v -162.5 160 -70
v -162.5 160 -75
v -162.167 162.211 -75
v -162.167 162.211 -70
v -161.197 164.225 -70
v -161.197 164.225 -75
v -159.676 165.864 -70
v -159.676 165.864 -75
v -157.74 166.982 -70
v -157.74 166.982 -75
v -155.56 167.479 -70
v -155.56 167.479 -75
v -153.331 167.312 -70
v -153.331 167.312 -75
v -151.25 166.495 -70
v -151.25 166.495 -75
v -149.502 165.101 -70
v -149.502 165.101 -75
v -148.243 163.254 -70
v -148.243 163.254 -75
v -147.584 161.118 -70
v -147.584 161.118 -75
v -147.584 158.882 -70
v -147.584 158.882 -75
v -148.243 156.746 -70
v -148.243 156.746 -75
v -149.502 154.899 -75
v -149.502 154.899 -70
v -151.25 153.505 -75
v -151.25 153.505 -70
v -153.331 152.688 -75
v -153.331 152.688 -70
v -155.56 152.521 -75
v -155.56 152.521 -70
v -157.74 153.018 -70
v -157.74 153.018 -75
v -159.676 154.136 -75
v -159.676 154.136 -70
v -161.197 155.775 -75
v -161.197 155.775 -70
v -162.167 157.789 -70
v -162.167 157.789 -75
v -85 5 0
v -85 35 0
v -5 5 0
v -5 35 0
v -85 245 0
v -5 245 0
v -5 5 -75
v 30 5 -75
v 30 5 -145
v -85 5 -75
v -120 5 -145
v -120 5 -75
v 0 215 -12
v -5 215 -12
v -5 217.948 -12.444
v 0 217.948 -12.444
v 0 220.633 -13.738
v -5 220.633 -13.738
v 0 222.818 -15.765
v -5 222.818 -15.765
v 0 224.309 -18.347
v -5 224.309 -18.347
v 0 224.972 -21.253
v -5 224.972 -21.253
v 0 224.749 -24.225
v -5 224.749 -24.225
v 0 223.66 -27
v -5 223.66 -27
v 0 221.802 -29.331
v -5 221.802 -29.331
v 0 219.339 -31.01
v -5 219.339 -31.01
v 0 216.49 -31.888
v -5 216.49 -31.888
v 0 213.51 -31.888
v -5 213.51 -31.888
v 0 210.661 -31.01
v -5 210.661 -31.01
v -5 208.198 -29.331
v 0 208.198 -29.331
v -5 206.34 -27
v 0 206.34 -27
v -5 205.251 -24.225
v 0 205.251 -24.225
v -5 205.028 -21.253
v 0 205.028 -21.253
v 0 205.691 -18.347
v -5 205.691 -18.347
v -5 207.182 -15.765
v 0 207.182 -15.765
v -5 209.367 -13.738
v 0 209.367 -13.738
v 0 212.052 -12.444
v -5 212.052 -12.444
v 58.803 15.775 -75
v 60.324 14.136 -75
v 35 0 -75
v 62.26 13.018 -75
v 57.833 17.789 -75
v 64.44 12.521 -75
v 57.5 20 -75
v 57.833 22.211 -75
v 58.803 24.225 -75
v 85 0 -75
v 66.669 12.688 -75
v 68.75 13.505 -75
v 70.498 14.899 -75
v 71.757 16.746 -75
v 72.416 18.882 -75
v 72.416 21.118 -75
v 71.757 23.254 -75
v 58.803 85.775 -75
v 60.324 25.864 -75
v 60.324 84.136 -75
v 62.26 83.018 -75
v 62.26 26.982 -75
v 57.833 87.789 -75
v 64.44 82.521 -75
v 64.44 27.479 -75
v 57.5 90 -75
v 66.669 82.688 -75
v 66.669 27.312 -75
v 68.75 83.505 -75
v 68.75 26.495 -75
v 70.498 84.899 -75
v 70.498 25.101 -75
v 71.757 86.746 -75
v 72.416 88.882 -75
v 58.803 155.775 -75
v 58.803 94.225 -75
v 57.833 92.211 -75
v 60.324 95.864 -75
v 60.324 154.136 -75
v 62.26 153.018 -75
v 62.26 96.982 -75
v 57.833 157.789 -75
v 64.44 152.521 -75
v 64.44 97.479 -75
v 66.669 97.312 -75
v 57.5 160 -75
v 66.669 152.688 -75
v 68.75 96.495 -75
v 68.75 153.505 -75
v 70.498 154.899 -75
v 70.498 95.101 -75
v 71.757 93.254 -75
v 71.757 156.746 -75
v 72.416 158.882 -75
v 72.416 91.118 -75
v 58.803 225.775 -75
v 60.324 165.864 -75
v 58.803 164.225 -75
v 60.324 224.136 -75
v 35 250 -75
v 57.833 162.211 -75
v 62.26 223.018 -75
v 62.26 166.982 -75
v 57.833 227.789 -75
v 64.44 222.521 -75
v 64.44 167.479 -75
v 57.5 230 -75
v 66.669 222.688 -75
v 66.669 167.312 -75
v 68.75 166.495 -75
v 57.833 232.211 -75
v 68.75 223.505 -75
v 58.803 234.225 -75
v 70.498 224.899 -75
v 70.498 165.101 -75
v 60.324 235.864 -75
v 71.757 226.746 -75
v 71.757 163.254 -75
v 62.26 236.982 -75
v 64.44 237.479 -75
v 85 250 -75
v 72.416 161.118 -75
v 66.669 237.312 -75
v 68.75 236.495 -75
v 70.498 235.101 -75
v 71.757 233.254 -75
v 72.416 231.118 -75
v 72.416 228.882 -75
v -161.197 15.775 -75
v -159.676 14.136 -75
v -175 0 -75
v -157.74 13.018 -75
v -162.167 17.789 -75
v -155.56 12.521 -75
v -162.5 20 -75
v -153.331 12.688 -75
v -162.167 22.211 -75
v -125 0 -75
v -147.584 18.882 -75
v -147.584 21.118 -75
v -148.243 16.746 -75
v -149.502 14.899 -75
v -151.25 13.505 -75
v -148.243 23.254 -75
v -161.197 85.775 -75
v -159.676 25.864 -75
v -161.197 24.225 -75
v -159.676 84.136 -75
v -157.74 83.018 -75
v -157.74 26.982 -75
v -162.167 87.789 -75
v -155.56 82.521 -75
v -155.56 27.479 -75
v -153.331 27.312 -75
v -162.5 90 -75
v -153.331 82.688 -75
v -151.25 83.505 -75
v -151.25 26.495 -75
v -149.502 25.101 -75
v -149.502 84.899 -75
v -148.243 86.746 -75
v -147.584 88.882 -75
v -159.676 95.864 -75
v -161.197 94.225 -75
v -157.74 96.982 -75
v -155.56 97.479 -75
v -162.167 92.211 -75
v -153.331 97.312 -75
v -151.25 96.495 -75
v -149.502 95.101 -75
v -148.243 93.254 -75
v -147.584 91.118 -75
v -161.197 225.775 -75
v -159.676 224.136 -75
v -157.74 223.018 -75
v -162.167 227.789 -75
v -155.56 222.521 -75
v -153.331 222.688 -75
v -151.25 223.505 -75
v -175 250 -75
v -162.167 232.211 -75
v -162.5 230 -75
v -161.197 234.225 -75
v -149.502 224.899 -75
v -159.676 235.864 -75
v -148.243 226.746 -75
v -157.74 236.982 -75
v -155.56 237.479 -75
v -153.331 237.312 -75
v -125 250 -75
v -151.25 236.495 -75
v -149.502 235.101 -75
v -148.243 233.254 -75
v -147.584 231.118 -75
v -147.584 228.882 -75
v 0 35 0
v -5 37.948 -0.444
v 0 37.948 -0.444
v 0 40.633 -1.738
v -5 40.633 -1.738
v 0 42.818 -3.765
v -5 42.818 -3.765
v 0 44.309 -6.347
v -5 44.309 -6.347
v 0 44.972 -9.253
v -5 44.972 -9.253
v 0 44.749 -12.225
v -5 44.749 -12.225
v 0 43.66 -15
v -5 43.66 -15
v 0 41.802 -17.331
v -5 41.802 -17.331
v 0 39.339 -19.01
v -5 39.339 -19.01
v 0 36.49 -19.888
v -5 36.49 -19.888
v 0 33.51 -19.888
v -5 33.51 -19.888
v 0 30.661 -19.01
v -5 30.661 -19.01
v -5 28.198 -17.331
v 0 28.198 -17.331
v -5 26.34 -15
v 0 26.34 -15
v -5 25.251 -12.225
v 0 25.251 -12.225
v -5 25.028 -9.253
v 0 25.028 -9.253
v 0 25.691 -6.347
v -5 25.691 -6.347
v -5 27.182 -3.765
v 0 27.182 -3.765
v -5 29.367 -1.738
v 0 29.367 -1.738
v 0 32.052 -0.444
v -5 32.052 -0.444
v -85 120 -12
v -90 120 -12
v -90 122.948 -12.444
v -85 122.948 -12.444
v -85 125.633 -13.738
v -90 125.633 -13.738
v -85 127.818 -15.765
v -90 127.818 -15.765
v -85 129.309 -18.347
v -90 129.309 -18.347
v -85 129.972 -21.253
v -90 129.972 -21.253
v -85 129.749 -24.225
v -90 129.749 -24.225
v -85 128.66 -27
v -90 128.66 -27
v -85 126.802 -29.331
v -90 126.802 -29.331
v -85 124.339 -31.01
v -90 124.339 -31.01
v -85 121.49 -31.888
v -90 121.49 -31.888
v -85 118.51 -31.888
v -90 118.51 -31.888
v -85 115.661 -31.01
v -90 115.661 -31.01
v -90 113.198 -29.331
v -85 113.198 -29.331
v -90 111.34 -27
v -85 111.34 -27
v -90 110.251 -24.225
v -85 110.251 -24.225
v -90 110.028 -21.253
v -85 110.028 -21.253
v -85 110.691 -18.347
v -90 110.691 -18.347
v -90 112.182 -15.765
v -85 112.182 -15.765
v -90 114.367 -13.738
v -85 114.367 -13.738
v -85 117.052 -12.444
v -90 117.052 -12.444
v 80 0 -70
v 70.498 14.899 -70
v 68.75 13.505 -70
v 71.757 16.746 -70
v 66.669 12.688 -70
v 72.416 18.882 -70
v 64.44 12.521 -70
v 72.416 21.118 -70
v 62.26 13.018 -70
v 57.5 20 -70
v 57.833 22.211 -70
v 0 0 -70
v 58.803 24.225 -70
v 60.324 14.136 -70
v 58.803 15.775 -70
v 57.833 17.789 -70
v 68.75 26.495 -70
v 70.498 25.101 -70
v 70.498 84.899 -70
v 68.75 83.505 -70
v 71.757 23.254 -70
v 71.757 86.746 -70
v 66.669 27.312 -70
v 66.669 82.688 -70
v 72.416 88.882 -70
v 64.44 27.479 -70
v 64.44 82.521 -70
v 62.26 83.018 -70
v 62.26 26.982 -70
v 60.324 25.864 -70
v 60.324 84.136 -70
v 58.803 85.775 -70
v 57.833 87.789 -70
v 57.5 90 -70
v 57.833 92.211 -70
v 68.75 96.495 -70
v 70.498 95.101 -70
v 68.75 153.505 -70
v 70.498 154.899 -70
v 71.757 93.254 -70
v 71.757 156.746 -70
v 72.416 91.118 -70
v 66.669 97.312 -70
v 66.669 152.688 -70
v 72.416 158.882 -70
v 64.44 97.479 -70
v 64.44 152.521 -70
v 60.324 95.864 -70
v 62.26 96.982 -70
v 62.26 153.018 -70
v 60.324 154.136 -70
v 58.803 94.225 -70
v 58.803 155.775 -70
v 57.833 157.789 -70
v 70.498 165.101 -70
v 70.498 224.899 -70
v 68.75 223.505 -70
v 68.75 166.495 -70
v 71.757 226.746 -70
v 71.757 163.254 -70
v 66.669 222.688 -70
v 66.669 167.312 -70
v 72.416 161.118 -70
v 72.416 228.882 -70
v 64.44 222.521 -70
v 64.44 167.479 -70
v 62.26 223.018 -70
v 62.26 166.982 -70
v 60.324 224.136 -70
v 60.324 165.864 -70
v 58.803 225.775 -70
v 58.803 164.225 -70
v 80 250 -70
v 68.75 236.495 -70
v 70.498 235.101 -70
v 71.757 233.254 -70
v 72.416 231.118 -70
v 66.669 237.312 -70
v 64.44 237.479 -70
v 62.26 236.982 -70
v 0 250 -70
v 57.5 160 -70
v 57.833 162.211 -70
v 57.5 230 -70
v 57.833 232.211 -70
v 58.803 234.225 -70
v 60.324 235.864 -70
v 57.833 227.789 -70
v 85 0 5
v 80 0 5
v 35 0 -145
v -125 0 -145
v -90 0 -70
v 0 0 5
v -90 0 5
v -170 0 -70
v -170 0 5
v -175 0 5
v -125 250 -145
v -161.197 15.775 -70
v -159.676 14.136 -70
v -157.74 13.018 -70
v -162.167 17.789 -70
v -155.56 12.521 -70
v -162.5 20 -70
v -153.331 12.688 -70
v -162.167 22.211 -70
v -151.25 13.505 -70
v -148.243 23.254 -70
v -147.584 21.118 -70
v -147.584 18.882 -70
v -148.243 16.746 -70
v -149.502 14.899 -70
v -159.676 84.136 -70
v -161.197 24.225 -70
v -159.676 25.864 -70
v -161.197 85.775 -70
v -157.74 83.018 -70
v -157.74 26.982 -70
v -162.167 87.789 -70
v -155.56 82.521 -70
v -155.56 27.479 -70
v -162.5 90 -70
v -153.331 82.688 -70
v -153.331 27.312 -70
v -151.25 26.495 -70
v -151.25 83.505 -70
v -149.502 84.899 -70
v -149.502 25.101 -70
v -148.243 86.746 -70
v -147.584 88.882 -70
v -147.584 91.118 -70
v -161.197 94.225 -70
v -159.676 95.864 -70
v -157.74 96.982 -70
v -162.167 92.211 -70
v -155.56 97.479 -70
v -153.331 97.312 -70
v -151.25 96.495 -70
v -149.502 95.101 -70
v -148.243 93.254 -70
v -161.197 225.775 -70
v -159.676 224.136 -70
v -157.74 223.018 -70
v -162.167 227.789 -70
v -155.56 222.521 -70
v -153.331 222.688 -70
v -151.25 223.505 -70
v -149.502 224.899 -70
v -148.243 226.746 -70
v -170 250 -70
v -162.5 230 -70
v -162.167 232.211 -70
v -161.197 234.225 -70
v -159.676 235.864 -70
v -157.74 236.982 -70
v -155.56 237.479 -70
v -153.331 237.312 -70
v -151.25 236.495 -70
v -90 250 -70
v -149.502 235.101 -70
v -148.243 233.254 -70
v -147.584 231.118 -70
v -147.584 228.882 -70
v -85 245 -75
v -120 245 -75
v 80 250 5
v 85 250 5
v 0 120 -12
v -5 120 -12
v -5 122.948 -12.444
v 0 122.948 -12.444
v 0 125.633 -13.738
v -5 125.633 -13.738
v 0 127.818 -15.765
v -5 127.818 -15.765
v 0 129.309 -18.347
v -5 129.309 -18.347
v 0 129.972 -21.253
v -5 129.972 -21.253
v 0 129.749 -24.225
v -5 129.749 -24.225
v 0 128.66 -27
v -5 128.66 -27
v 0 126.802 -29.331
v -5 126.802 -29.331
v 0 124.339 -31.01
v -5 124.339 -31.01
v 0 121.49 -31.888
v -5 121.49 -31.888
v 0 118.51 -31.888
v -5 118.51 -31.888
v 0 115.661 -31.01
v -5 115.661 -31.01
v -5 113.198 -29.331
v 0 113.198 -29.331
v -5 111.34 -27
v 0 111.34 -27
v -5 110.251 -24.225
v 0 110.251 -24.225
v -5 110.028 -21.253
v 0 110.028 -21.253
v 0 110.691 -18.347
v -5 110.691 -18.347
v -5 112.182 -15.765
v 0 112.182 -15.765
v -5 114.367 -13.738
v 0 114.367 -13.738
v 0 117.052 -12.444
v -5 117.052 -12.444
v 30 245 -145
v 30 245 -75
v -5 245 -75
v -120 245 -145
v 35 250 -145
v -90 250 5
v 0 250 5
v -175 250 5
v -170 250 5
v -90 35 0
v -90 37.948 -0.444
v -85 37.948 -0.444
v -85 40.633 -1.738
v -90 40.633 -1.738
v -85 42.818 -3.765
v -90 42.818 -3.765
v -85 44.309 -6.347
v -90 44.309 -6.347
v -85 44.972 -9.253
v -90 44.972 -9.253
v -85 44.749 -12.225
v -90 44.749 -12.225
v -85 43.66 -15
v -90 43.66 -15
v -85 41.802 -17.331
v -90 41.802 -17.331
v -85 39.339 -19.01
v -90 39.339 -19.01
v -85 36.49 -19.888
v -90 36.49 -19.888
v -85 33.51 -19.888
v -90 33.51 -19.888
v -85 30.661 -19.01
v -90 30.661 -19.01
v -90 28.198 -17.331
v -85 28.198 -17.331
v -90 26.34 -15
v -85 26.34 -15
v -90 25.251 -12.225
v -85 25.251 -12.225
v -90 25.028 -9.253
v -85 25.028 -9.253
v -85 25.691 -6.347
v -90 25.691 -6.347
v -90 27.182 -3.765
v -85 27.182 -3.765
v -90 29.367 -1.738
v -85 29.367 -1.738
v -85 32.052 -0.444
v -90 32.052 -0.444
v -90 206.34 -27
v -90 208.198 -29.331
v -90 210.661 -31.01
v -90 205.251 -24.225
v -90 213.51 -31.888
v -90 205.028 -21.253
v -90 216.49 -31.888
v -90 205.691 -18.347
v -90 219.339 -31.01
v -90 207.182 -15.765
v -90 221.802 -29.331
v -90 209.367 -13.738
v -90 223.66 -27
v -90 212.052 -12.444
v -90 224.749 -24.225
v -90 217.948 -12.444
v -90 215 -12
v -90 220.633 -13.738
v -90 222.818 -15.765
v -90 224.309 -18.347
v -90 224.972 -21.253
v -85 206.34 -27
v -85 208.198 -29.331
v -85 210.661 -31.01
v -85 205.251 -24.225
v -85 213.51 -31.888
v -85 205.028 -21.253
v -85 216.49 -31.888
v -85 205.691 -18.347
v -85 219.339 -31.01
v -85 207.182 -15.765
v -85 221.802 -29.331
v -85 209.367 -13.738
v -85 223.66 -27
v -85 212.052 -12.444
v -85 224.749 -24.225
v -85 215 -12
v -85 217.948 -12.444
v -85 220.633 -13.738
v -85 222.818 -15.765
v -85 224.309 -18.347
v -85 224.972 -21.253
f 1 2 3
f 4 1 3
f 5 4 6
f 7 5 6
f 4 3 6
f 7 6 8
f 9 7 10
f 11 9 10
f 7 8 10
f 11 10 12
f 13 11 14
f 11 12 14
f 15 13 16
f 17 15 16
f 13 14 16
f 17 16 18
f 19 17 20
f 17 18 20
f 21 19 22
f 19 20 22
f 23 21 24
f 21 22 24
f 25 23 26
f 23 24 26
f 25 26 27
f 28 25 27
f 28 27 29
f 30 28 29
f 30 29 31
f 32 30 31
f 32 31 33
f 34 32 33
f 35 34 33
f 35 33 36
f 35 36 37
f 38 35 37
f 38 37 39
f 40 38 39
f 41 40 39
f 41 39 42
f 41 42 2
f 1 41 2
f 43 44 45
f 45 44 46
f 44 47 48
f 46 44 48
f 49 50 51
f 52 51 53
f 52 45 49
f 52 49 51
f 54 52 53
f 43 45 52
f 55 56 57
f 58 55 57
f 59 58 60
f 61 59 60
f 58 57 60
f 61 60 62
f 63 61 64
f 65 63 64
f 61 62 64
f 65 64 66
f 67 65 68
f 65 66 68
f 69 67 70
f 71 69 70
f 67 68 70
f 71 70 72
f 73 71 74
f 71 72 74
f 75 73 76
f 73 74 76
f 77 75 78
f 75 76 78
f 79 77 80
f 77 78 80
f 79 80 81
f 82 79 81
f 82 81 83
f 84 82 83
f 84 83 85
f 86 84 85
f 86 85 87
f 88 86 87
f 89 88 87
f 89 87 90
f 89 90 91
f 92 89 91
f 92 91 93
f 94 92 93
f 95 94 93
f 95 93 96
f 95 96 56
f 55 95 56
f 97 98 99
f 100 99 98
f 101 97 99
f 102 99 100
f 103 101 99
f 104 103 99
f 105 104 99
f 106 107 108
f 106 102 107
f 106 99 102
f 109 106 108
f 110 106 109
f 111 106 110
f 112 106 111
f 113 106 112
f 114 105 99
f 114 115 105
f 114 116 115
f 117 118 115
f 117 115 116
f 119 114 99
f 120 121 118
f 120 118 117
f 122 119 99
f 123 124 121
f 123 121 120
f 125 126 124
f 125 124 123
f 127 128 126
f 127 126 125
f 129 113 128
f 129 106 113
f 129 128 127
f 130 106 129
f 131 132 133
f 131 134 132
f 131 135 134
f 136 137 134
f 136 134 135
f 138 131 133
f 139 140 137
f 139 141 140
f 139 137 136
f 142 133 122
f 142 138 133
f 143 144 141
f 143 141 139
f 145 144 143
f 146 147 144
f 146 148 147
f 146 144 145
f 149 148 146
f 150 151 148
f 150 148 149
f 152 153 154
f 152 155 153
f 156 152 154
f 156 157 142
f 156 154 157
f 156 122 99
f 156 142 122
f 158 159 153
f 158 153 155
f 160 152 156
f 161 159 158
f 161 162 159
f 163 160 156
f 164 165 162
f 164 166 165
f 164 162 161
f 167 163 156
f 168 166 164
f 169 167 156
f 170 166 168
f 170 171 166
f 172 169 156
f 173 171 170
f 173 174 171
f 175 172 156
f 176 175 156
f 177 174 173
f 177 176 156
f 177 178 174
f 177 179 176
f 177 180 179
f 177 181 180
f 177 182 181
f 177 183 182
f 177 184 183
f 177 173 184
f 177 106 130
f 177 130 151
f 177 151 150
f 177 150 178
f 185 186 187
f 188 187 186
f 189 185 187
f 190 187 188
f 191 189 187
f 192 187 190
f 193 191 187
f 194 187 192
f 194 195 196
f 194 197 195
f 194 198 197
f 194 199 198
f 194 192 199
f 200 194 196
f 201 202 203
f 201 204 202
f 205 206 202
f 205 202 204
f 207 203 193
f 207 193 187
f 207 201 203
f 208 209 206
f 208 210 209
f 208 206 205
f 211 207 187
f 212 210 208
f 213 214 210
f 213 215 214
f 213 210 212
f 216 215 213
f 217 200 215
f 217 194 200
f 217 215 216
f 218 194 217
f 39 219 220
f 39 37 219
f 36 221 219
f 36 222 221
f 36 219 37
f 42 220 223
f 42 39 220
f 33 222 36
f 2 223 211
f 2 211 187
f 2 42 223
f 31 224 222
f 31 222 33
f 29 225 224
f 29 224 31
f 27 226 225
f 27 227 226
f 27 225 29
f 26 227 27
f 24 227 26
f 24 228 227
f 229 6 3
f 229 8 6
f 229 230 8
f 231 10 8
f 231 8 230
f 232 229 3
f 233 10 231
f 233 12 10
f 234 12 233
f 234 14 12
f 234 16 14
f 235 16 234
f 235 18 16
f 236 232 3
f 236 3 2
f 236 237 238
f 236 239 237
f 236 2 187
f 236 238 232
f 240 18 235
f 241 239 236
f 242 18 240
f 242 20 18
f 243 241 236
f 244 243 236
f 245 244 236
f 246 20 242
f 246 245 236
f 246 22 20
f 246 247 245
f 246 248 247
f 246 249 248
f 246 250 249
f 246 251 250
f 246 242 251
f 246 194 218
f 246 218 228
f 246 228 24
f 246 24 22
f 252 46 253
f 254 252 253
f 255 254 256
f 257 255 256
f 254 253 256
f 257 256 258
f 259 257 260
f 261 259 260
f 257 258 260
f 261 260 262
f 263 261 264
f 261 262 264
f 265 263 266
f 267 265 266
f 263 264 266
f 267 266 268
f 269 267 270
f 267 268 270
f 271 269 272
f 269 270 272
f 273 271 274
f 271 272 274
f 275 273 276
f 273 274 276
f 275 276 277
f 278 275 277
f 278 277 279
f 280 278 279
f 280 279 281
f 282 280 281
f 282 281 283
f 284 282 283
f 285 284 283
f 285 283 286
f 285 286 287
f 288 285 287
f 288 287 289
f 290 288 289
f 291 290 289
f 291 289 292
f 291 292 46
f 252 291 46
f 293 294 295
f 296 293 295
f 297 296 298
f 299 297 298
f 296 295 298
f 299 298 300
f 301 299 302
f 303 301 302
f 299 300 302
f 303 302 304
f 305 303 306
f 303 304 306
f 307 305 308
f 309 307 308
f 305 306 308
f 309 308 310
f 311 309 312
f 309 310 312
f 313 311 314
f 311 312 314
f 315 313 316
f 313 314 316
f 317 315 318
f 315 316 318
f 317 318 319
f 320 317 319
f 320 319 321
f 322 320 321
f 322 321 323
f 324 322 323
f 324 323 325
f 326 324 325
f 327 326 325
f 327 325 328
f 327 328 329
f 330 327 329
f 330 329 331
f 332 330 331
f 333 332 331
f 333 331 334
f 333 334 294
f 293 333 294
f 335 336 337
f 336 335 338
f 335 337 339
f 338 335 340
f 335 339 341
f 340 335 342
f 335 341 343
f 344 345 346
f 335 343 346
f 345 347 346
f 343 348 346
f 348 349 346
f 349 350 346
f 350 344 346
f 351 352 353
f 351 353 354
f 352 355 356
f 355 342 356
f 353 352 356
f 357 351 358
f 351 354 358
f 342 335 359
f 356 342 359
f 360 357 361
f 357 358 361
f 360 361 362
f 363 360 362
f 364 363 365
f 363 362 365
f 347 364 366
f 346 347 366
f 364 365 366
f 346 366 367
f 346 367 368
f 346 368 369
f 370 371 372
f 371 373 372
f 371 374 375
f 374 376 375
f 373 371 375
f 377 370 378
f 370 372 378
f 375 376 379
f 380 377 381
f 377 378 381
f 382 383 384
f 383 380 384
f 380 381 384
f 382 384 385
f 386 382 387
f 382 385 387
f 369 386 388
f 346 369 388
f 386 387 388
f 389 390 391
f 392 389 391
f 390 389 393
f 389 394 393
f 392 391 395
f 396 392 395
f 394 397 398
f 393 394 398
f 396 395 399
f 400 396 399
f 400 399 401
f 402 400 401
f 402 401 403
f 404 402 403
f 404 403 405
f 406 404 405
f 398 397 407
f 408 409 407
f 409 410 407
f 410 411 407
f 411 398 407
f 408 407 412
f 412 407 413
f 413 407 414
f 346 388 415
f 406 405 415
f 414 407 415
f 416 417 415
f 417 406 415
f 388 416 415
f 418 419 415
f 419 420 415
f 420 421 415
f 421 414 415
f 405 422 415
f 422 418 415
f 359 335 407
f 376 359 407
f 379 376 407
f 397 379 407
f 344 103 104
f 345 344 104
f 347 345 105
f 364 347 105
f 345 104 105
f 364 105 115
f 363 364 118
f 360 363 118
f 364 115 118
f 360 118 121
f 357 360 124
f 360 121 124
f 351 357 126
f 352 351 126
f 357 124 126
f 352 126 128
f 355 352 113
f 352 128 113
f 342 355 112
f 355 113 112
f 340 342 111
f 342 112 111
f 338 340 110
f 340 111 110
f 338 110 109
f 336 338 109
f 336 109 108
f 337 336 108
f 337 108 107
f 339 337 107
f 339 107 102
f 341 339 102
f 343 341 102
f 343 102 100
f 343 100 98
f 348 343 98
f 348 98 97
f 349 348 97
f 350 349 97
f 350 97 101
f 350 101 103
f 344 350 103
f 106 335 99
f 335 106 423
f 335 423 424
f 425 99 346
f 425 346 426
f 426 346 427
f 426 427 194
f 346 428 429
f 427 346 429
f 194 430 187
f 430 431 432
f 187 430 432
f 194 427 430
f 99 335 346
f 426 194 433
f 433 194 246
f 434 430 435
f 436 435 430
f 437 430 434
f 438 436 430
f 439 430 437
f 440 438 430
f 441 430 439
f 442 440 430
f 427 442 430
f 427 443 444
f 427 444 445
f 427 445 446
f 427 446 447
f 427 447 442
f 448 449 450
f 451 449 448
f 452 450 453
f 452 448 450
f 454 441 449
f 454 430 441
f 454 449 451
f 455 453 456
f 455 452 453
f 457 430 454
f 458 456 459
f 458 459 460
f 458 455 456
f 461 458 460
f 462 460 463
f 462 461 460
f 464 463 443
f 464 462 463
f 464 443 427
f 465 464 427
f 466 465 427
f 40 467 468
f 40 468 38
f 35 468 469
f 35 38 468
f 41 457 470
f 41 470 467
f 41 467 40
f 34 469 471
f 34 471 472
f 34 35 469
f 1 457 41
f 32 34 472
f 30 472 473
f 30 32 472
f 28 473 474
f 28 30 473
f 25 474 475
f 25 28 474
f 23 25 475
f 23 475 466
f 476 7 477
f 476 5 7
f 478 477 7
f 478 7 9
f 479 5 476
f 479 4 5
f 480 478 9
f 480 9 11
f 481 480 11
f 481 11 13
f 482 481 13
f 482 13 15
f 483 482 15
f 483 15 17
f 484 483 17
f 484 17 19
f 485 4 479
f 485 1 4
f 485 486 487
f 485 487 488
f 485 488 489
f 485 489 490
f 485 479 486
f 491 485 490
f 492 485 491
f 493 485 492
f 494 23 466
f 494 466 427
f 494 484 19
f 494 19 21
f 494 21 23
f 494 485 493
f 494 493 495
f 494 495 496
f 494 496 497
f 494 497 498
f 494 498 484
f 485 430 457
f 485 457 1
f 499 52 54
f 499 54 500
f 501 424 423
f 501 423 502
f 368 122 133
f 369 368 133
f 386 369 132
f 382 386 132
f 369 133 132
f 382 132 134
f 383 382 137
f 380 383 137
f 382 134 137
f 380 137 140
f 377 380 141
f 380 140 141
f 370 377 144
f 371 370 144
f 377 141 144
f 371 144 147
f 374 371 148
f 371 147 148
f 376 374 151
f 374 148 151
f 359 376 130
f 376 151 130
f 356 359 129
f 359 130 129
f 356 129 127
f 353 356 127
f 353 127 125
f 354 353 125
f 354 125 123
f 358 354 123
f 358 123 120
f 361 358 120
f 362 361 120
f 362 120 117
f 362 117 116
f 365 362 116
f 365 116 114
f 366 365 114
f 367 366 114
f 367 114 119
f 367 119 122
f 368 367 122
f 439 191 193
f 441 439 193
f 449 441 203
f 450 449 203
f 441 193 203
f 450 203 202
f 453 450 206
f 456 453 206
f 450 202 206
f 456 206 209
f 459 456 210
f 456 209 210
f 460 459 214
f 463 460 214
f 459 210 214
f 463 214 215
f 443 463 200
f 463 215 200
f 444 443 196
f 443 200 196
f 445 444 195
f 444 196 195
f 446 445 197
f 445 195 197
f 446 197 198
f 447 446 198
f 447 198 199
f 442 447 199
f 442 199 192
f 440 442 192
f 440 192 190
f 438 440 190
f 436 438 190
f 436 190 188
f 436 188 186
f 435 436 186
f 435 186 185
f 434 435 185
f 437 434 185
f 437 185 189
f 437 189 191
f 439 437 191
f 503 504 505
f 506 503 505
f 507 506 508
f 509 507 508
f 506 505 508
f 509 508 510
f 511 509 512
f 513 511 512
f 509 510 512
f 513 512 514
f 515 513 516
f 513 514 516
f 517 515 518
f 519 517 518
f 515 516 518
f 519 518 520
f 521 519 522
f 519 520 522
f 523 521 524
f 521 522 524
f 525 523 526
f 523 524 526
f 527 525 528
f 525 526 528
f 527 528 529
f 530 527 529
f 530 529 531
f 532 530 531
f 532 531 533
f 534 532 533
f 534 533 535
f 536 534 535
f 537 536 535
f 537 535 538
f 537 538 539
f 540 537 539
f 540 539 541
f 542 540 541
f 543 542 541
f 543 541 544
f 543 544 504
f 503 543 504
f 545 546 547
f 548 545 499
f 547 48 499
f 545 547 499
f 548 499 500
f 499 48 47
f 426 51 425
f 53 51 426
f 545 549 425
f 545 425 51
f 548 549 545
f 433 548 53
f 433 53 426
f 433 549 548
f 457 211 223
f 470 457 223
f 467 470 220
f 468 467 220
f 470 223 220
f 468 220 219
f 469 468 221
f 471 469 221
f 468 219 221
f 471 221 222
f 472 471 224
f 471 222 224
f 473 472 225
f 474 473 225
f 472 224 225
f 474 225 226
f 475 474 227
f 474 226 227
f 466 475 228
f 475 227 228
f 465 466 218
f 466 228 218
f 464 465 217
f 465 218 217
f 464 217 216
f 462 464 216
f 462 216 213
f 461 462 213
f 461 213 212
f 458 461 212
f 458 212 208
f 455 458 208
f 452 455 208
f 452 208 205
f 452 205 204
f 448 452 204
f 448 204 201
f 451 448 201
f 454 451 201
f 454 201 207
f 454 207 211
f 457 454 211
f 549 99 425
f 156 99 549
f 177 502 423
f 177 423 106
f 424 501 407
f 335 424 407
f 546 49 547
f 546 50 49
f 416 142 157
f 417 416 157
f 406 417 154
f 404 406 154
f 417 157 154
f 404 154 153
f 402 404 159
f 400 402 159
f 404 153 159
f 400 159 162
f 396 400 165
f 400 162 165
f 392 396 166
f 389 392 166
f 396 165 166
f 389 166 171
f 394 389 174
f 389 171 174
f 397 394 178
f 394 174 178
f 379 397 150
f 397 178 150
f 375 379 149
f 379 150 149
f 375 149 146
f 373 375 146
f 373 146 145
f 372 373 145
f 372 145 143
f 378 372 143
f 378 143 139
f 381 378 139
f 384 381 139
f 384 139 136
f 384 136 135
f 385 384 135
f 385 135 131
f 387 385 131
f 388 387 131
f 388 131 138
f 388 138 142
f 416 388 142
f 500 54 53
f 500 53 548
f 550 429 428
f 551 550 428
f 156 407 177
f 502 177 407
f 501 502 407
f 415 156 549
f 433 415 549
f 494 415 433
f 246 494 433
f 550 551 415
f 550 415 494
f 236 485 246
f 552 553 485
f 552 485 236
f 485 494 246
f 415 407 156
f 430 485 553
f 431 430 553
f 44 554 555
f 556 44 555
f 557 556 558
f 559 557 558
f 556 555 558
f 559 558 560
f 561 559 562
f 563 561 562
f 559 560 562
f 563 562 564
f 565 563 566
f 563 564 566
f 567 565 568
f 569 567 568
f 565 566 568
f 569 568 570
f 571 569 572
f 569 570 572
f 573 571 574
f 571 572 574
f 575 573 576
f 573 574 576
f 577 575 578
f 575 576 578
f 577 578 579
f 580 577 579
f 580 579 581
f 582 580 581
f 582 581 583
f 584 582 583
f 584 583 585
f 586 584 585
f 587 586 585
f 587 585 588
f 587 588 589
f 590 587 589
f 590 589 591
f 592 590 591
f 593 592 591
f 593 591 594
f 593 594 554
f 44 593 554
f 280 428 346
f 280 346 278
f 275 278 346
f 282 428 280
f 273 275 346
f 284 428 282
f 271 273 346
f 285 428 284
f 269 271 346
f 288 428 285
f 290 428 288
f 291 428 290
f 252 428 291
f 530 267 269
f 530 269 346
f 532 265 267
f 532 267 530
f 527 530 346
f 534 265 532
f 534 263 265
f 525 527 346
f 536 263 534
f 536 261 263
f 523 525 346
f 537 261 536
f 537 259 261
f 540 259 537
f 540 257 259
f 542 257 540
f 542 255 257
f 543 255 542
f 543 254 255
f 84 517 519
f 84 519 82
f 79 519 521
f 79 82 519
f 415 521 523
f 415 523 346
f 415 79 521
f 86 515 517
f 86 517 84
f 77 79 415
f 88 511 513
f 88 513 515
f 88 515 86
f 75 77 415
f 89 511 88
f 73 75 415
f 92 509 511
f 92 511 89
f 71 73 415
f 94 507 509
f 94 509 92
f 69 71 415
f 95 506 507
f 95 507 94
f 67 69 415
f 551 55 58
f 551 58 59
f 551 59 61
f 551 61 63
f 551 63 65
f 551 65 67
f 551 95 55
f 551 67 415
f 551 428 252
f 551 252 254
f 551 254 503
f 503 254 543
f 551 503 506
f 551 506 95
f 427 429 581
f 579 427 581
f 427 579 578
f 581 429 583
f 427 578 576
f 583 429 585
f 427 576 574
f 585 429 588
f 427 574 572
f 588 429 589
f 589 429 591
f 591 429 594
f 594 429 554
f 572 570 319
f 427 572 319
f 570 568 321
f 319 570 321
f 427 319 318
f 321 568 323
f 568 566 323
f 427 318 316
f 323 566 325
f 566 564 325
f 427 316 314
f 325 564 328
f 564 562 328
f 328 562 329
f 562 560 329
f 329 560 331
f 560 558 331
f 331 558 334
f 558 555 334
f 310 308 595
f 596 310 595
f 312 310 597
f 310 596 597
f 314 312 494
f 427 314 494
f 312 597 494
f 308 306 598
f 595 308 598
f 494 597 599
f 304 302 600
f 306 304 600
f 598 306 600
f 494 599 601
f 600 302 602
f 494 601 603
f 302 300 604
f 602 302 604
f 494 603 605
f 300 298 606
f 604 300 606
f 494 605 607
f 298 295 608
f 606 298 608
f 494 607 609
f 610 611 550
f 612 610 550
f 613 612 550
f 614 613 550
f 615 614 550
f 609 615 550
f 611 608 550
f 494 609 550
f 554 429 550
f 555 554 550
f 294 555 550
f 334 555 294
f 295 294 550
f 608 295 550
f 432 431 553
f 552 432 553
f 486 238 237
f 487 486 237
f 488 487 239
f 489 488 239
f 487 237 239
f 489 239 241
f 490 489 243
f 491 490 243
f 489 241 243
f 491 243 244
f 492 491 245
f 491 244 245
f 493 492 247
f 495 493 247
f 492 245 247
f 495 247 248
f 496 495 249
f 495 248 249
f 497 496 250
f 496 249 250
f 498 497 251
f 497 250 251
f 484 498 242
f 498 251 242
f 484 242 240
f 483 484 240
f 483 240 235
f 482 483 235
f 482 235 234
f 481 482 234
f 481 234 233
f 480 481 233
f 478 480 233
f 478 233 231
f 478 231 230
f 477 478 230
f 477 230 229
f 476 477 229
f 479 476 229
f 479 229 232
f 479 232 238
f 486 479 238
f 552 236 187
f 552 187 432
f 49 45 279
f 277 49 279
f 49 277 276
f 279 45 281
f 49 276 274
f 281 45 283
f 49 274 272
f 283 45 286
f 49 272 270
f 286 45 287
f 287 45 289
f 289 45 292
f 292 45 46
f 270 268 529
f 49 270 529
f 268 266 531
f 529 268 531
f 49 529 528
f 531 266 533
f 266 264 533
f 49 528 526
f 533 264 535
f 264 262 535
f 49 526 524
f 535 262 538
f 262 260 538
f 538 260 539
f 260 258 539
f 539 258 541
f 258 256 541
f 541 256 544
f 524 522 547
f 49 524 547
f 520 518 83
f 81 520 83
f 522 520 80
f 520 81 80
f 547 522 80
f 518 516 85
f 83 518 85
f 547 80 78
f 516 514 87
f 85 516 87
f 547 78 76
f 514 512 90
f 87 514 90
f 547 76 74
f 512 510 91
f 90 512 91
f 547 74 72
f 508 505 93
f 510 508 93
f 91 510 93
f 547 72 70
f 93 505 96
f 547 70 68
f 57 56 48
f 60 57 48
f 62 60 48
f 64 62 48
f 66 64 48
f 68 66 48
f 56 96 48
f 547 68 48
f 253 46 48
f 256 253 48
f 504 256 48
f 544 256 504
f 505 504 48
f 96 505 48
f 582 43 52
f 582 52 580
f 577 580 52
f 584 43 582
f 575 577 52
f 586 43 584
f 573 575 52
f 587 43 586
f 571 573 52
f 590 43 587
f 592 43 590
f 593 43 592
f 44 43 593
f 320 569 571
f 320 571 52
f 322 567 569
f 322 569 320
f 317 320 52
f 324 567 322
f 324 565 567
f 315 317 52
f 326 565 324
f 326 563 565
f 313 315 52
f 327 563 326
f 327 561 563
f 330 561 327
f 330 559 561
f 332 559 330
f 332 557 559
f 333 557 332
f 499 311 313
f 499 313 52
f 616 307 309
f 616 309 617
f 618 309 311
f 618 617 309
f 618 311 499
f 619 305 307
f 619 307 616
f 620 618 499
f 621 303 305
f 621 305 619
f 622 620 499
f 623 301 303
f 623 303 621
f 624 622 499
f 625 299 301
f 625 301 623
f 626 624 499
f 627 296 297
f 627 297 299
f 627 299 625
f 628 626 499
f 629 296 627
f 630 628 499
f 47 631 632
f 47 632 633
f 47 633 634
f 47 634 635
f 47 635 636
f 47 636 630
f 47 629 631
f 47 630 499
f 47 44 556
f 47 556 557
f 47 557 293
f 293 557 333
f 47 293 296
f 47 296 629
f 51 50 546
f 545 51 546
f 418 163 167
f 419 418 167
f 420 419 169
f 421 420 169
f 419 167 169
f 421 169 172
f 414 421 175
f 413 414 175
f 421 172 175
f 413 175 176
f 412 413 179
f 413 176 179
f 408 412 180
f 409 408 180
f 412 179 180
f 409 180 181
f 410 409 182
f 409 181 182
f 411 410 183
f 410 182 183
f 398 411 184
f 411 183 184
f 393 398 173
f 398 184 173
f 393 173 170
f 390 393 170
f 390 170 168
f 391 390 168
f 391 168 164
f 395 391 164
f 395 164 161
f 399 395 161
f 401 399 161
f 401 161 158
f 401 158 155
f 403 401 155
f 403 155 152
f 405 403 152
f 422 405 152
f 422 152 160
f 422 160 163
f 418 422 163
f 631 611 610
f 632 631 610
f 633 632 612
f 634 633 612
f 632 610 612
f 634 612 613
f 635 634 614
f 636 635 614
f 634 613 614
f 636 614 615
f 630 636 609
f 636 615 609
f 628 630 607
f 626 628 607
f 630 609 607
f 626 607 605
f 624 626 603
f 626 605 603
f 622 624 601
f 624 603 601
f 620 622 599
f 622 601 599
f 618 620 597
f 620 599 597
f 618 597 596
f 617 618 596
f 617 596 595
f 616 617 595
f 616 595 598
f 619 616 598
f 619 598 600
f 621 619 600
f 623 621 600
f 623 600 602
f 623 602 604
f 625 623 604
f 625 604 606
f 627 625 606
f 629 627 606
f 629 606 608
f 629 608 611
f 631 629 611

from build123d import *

# Parameters (mm, degrees)
ESQUISSE1_W             = 90
ESQUISSE1_H             = 250
BOSS_EXTRU_1_DEPTH      = 5
ESQUISSE2_W             = 90
ESQUISSE2_H             = 250
ESQUISSE2_W_2           = 80
ESQUISSE2_H_2           = 240
BOSS_EXTRU_2_DEPTH      = 70
BOSS_EXTRU_3_DEPTH      = 5
ESQUISSE4_R             = 10
ENL_V_MAT_EXTRU_2_DEPTH = 171
ESQUISSE5_W             = 80
ESQUISSE5_H             = 250
BOSS_EXTRU_4_DEPTH      = 5
ESQUISSE6_W             = 80
ESQUISSE6_H             = 250
BOSS_EXTRU_5_DEPTH      = 5
ESQUISSE7_W             = 160
ESQUISSE7_H             = 250
ESQUISSE7_W_2           = 150
ESQUISSE7_H_2           = 240
BOSS_EXTRU_6_DEPTH      = 70
ESQUISSE10_R            = 7.5
ENL_V_MAT_EXTRU_3_DEPTH = 50


with BuildPart() as part:
    # Esquisse1 → Boss.-Extru.1 (new body)
    with BuildSketch(Plane.XY):
        with Locations((-45, 125)):
            Rectangle(ESQUISSE1_W, ESQUISSE1_H)
    extrude(amount=BOSS_EXTRU_1_DEPTH)

    # Esquisse2 → Boss.-Extru.2 (add)
    with BuildSketch(Plane(origin=(0, 0, 0), x_dir=(-1, 0, 0), z_dir=(0, 0, -1))):
        with Locations((45, 125)):
            Rectangle(ESQUISSE2_W, ESQUISSE2_H)
        with Locations((45, 125)):
            Rectangle(ESQUISSE2_W_2, ESQUISSE2_H_2, mode=Mode.SUBTRACT)
    extrude(amount=BOSS_EXTRU_2_DEPTH)

    # Esquisse3 → Boss.-Extru.3 (add)
    with BuildSketch(Plane(origin=(0, 0, -70), x_dir=(-1, 0, 0), z_dir=(0, 0, -1))):
        Polygon((6.025463364, 250), (-80, 250), (-80, 0), (-15, 0), (45, 0), (45, 5), (5, 5), (5, 245), (45, 245), (45, 250), align=None)
    boss_extru_3 = extrude(amount=BOSS_EXTRU_3_DEPTH)

    # Symétrie1: Boss.-Extru.3 across plane
    add(boss_extru_3.mirror(Plane(origin=(-45, 245, -75), x_dir=(0, 0, 1), z_dir=(1, 0, 0))))

    # Esquisse4 → Enlèv. mat.-Extru.2 (cut, through all)
    with BuildSketch(Plane.ZY.offset(90)):
        with Locations((-22, 215)):
            Circle(ESQUISSE4_R)
        with Locations((-22, 120)):
            Circle(ESQUISSE4_R)
        with Locations((-10, 35)):
            Circle(ESQUISSE4_R)
    extrude(amount=-ENL_V_MAT_EXTRU_2_DEPTH, mode=Mode.SUBTRACT)

    # Esquisse5 → Boss.-Extru.4 (add)
    with BuildSketch(Plane(origin=(80, 0, 0), x_dir=(0, 0, -1), z_dir=(1, 0, 0))):
        with Locations((35, 125)):
            Rectangle(ESQUISSE5_W, ESQUISSE5_H)
    extrude(amount=BOSS_EXTRU_4_DEPTH)

    # Esquisse6 → Boss.-Extru.5 (add)
    with BuildSketch(Plane.ZY.offset(170)):
        with Locations((-35, 125)):
            Rectangle(ESQUISSE6_W, ESQUISSE6_H)
    extrude(amount=BOSS_EXTRU_5_DEPTH)

    # Esquisse7 → Boss.-Extru.6 (add)
    with BuildSketch(Plane(origin=(0, 0, -75), x_dir=(-1, 0, 0), z_dir=(0, 0, -1))):
        with Locations((45, 125)):
            Rectangle(ESQUISSE7_W, ESQUISSE7_H)
        with Locations((45, 125)):
            Rectangle(ESQUISSE7_W_2, ESQUISSE7_H_2, mode=Mode.SUBTRACT)
    extrude(amount=BOSS_EXTRU_6_DEPTH)

    # Esquisse10 → Enlèv. mat.-Extru.3 (cut)
    with BuildSketch(Plane(origin=(0, 0, -75), x_dir=(-1, 0, 0), z_dir=(0, 0, -1))):
        with Locations((155, 230)):
            Circle(ESQUISSE10_R)
        with Locations((-65, 230)):
            Circle(ESQUISSE10_R)
        with Locations((-65, 160)):
            Circle(ESQUISSE10_R)
        with Locations((155, 160)):
            Circle(ESQUISSE10_R)
        with Locations((-65, 90)):
            Circle(ESQUISSE10_R)
        with Locations((155, 90)):
            Circle(ESQUISSE10_R)
        with Locations((-65, 20)):
            Circle(ESQUISSE10_R)
        with Locations((155, 20)):
            Circle(ESQUISSE10_R)
    extrude(amount=-ENL_V_MAT_EXTRU_3_DEPTH, mode=Mode.SUBTRACT)


solid = part.part
